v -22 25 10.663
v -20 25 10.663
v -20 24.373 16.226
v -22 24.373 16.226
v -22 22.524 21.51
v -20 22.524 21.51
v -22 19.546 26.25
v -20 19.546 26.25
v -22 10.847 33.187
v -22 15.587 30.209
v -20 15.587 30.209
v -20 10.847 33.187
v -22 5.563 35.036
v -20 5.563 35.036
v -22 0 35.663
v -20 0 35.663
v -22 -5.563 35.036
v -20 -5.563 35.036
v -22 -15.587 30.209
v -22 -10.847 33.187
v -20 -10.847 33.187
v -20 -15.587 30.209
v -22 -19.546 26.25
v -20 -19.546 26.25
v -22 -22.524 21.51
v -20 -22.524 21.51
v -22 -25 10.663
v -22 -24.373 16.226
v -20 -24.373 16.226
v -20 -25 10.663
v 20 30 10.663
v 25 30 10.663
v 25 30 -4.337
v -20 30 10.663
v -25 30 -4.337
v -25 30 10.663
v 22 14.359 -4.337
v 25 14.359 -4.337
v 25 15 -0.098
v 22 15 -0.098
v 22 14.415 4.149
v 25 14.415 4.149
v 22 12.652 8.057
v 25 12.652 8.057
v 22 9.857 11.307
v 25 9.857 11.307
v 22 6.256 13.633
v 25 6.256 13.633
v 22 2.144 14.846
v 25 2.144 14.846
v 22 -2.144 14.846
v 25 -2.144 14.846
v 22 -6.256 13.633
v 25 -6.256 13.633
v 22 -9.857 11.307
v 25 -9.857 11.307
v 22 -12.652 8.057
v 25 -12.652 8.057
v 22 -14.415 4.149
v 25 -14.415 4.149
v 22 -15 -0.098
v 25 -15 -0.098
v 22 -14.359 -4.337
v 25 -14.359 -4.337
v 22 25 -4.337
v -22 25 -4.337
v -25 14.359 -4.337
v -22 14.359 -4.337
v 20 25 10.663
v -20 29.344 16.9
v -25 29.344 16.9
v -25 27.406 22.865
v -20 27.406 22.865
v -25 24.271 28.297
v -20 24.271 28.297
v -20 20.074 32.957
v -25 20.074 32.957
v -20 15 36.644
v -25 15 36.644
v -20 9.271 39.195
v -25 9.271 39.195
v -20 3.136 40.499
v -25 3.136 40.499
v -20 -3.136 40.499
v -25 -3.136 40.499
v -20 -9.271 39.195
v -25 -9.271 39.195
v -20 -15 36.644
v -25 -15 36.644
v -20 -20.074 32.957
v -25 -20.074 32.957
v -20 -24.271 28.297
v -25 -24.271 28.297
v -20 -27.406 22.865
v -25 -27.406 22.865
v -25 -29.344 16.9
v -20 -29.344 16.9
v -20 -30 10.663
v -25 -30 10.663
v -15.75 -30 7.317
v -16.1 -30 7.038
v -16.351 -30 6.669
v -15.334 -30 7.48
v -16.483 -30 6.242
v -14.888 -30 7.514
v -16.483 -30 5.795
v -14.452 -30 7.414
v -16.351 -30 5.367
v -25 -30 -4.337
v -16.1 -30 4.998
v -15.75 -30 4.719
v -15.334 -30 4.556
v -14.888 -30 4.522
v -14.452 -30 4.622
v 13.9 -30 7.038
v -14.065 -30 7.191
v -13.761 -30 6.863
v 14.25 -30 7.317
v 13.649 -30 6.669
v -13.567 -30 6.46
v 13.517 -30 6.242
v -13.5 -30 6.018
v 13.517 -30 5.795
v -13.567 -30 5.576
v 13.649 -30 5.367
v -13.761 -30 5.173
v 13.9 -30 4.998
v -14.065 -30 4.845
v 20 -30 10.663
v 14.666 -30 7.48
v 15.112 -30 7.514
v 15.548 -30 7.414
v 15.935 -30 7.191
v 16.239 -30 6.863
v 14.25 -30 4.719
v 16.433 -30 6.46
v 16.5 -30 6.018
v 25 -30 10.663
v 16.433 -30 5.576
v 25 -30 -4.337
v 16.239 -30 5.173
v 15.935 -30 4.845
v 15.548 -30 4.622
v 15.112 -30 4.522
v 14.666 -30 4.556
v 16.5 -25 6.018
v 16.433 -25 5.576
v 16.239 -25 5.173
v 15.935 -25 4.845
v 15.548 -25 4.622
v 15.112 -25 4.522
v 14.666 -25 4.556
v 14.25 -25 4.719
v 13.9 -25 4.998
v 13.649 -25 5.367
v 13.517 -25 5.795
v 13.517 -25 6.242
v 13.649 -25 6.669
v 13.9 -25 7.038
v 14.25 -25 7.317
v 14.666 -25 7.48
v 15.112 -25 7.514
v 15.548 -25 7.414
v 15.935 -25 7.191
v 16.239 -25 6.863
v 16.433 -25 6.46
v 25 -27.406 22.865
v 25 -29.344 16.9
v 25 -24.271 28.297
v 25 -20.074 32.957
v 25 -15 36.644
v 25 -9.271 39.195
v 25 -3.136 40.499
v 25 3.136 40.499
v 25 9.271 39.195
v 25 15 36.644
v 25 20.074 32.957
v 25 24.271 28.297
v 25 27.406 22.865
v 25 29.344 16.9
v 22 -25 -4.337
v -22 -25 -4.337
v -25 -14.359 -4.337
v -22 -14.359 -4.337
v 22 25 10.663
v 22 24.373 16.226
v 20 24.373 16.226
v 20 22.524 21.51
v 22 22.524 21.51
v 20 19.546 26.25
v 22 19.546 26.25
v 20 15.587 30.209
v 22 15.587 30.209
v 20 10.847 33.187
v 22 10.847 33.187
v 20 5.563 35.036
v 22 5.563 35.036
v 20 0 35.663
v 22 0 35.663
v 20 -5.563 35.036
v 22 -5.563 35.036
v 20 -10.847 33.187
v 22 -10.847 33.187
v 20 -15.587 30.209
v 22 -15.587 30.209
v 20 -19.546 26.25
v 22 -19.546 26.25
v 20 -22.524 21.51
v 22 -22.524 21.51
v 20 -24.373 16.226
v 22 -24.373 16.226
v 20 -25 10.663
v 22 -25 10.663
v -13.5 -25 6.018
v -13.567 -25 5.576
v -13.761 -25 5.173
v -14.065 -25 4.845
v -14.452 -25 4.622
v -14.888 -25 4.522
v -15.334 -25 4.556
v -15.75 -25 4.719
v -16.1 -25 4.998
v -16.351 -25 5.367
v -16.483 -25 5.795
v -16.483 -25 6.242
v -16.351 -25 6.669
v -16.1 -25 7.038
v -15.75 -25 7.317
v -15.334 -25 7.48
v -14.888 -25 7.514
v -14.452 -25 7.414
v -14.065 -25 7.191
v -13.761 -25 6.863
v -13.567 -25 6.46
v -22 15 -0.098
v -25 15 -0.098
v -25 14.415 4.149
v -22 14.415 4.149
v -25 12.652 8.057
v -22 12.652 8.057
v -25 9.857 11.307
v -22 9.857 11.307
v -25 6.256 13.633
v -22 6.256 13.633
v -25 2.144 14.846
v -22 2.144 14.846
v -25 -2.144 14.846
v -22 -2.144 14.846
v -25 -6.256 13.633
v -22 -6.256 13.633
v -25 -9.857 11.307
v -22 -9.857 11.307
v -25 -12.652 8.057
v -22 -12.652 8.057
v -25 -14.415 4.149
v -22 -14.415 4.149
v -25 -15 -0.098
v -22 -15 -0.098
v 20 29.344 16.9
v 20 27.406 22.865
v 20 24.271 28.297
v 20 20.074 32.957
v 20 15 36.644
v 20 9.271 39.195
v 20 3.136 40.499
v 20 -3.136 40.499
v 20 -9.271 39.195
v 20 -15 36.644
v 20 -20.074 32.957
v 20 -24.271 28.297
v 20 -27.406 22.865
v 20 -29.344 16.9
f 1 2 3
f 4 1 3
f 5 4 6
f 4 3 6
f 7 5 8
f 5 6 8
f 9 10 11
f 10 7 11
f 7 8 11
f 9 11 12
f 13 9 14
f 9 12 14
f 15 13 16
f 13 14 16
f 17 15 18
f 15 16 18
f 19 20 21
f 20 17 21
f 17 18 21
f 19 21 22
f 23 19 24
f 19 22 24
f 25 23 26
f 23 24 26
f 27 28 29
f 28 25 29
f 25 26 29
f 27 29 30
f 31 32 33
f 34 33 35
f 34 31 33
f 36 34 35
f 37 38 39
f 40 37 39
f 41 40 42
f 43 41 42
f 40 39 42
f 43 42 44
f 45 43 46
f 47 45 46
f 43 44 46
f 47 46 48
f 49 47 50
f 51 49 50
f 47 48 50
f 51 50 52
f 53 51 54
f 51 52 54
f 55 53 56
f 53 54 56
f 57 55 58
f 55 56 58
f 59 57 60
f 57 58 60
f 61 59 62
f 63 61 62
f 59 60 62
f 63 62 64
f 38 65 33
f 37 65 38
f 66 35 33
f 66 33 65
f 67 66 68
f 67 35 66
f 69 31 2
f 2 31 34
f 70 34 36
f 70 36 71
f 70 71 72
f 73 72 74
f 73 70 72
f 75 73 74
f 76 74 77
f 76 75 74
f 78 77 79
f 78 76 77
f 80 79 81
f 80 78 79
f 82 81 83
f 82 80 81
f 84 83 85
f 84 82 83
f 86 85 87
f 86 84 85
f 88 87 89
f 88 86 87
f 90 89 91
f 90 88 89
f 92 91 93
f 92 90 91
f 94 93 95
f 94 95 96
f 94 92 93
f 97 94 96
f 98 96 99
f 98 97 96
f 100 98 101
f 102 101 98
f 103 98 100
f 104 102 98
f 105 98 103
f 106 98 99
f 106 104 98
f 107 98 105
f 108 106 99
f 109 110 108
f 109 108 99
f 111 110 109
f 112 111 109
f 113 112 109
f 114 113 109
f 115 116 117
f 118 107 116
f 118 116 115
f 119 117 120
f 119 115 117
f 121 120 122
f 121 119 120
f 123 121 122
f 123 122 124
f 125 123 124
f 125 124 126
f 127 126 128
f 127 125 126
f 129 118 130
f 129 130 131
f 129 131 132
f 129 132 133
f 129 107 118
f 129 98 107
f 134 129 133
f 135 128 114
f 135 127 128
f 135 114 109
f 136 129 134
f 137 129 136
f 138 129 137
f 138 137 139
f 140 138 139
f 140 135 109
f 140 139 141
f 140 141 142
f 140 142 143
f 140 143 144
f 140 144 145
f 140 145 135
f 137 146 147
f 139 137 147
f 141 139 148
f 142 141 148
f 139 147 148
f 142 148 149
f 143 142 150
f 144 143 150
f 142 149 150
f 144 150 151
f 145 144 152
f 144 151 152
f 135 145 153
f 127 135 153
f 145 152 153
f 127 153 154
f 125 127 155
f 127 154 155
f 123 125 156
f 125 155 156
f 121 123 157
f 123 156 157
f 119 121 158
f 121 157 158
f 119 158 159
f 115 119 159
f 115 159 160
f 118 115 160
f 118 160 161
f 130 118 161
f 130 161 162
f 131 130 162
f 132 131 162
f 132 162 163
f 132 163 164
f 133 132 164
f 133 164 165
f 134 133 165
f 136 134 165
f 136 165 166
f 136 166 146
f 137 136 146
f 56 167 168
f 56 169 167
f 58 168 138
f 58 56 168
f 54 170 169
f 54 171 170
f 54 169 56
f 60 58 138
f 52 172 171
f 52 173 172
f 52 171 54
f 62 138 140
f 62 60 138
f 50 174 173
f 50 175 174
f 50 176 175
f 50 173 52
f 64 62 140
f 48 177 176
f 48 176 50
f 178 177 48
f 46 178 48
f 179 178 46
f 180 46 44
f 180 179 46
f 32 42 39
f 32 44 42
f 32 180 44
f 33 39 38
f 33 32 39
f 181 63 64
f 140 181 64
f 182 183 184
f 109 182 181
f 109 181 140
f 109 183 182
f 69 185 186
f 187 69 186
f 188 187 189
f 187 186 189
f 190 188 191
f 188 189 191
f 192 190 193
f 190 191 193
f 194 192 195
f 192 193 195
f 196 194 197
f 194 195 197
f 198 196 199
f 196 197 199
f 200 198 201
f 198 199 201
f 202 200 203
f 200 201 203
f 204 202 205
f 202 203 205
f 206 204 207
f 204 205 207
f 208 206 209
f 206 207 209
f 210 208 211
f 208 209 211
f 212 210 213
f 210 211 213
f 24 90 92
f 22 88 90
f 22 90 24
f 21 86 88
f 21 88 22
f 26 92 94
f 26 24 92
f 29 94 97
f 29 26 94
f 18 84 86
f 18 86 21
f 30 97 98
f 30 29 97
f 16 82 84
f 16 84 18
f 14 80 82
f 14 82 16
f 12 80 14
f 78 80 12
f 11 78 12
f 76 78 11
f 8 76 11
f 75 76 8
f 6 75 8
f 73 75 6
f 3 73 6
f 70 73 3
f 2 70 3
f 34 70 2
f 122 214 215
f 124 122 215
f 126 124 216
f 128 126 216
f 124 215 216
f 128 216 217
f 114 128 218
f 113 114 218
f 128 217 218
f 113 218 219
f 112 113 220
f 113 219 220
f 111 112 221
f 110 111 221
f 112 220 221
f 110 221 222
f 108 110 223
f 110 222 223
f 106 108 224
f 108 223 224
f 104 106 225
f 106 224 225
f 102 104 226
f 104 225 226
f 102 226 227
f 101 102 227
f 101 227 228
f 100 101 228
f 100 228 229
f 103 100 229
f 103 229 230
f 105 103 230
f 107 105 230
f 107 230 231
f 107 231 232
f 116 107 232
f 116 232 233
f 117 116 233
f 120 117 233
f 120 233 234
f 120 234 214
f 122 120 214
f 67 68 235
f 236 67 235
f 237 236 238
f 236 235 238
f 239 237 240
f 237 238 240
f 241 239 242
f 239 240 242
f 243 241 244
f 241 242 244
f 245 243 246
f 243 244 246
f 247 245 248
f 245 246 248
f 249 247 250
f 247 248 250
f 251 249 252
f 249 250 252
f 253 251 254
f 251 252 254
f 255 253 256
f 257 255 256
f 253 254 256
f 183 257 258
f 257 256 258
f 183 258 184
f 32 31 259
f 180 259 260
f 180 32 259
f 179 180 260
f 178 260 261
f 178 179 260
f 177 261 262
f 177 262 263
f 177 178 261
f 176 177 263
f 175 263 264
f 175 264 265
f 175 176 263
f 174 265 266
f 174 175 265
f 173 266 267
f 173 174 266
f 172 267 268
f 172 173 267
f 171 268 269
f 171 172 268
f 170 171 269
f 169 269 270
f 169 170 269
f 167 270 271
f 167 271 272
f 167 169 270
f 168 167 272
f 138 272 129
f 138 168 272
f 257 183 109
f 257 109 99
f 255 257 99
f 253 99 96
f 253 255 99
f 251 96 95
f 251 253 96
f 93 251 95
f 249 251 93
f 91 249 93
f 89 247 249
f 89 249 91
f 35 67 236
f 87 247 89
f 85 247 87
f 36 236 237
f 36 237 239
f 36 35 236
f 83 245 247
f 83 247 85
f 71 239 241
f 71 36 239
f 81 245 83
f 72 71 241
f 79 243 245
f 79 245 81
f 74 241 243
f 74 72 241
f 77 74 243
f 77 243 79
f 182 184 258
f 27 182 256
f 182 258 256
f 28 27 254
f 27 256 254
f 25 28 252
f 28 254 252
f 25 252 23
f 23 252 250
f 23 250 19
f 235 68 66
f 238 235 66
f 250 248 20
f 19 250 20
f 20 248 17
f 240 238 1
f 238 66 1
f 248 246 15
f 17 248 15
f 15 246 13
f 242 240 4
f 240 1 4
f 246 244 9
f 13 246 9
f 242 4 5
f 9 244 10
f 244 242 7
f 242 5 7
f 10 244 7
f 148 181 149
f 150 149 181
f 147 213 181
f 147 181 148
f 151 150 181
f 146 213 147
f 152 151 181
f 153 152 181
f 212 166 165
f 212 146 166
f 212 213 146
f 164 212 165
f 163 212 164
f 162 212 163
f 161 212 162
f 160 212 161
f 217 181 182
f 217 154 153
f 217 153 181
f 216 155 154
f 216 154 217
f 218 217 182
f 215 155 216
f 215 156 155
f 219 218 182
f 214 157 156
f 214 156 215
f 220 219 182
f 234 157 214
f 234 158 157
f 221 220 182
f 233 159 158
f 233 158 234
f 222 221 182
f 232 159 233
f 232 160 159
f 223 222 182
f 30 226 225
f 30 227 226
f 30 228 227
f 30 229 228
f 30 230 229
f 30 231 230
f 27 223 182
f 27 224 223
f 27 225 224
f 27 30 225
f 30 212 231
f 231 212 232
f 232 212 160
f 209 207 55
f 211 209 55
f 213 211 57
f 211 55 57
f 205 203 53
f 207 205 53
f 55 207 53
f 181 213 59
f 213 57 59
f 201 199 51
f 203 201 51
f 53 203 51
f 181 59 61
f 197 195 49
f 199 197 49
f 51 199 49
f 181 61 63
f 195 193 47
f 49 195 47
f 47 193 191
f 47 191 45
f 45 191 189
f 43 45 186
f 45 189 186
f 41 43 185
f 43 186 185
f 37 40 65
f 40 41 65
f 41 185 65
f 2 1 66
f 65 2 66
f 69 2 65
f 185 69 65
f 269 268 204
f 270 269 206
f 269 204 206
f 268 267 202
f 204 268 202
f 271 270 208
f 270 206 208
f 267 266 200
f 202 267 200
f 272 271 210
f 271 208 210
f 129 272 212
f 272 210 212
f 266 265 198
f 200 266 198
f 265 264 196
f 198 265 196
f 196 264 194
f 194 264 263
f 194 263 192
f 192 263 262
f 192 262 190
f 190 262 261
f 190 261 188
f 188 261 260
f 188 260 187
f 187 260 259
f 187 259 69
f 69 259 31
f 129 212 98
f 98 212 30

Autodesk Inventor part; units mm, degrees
ref_plane "YZ Plane" through (0, 0, 0) normal (1, 0, 0) x (0, 1, 0)
ref_plane "XZ Plane" through (0, 0, 0) normal (0, 1, 0) x (-1, 0, 0)
sketch "Szkic1" plane through (0, 0, 0) normal (0, 0, 1) x (1, 0, 0)
  line L0 (19.3649, 0) -> (-19.3649, 0)
  line L1 (-19.3649, 0) -> (-103.6215, 0)
  line L2 (-103.6215, 0) -> (-125, 0)
  line L3 (-125, 0) -> (-103.6215, 0)
  line L4 (-103.6215, 0) -> (-19.3649, 0)
  line L5 (-19.3649, 0) -> (19.3649, 0)
  line L6 (19.3649, 0) -> (103.6215, 0)
  line L7 (103.6215, 0) -> (125, 0)
  line L8 (125, 0) -> (103.6215, 0)
  line L9 (103.6215, 0) -> (19.3649, 0)
  line L10 (45, 0) -> (-45, 0)
  line L11 (45, 0) -> (105.3748, 0)
  line L12 (105.3748, 0) -> (130.0712, 0)
  line L13 (130.0712, 0) -> (105.3748, 0)
  line L14 (105.3748, 0) -> (-20.2973, 0)
  line L15 (-20.2973, 0) -> (-105.3748, 0)
  line L16 (-105.3748, 0) -> (-105.3748, 0)
  line L17 (-105.3748, 0) -> (-130.0712, 0)
  line L18 (-130.0712, 0) -> (-105.3748, 0)
  line L19 (-105.3748, 0) -> (-45, 0)
  arc A0 (119.2902, -19.1594) -> (125, 0) centre (90, 0) ccw
  arc A1 (19.3649, -35) -> (103.6215, -25.7743) centre (42.8262, 140.0954) ccw
  arc A2 (103.6215, -25.7743) -> (125, 0) centre (91.4189, 6.1005) ccw
  arc A3 (20.2973, -40.1624) -> (105.3748, -30.457) centre (42.8262, 140.0954) ccw
  arc A4 (105.3748, -30.457) -> (130.0712, 0) centre (91.4189, 6.1005) ccw
  arc A5 (-125, 0) -> (-103.6215, -25.7743) centre (-91.4189, 6.1005) ccw
  arc A6 (-130.0712, 0) -> (-105.3748, -30.457) centre (-91.4189, 6.1005) ccw
  arc A7 (-98.4086, -33.9749) -> (-78.2644, -32.9739) centre (-90, 0) ccw
  arc A8 (-103.6215, -25.7743) -> (-19.3649, -35) centre (-42.8262, 140.0954) ccw
  arc A9 (-19.3649, -35) -> (19.3649, -35) centre (0, 0) ccw
  arc A10 (-20.2973, -40.1624) -> (20.2973, -40.1624) centre (0, 0) ccw
  arc A11 (-105.3748, -30.457) -> (-20.2973, -40.1624) centre (-42.8262, 140.0954) ccw
  line L20 (-105.3748, 0) -> (-20.2973, 0)
  line L21 (19.3649, 0) -> (-19.3649, 0)
  line L22 (130.0712, 0) -> (-130.0712, 0)
  point P0 (0, 0)
  point P1 (-119.2902, -19.1594)
  point P2 (-125, 0)
  point P3 (125, 0)
  dimension "d0" = 70
  dimension "d1" = 70
  dimension "d2" = 250
  dimension "d3" = 90
revolve "Obrót1" add sketch "Szkic1" angle 180 about axis through (130.0712, 0, 0) along (-1, 0, 0) contours L12 A4 A3 A10 A11 A7 A8 A9 A1 A2 | A5 A8 A7 A11 A6 L17
sketch "Szkic2" plane through (0, 0, 0) normal (0, 1, 0) x (-1, 0, 0)
  line L0 (-25, 45) -> (25, 45)
  line L1 (25, 45) -> (25, 15)
  line L2 (25, 15) -> (-25, 15)
  line L3 (-25, 15) -> (-25, 45)
  line L4 (-20.2973, 0) -> (20.2973, 0) projected
  arc A0 (105.3748, 30.457) -> (20.2973, 40.1624) centre (42.8262, -140.0954) ccw projected
  arc A1 (20.2973, 40.1624) -> (-20.2973, 40.1624) centre (0, 0) ccw projected
  point P0 (0, 0)
  point P1 (0, 45)
  point P2 (0, 0)
  point P3 (0, 45)
  dimension "d5" = 50
  dimension "d6" = 30
extrude "Wyciągnięcie proste1" cut sketch "Szkic2" along normal mid plane 91
sketch "Szkic3" plane through (25, 0, 0) normal (-1, 0, 0) x (0, 0, 1)
  point P0 (0, 0)
sketch "Szkic4" plane through (25, 0, 0) normal (-1, 0, 0) x (0, 0, 1)
  arc A0 (15, -37.8222) -> (15, 37.8222) centre (0, 0) ccw projected
  line L0 (15, 37.8222) -> (15, 32.3552) projected
  arc A1 (15, -32.3552) -> (15, 32.3552) centre (0, 0) ccw projected
  line L1 (15, -32.3552) -> (15, -37.8222) projected
  circle A2 centre (10.6631, 0) radius 25
  arc A3 (15, -32.3552) -> (15, 32.3552) centre (0, 0) ccw projected
  circle A4 centre (10.6631, 0) radius 30
  point P0 (0, 0)
  point P1 (35.6631, 0)
  point P2 (22.7682, 27.4494)
  point P3 (22.7682, -27.4494)
  point P4 (35.6631, 0)
  dimension "d9" = 50
  dimension "d19" = 60
extrude "Wyciągnięcie proste2" add sketch "Szkic4" along normal blind 50 contours A4 A1 | A1 A4
sketch "Szkic5" plane through (25, 0, 10.6631) normal (1, 0, 0) x (0, 0, -1)
  arc A0 (-12.1051, -27.4494) -> (-12.1051, 27.4494) centre (0, 0) ccw projected
  circle A1 centre (0, 0) radius 25 projected
  line L0 (0, 25) -> (0, 30)
  line L1 (0, -25) -> (0, -30)
  point P0 (10.6631, 0)
  point P1 (-12.0349, 27.5074)
  point P2 (-12.0349, -27.5074)
  point P3 (-25, 0)
extrude "Wyciągnięcie proste3" cut sketch "Szkic5" against normal blind 50 contours L1 A1 L0 A0
ref_plane "Płaszczyzna konstrukcyjna1" through (0, 0, 0) normal (1, 0, 0) x (0, 0, -1)
sketch "Szkic7" plane through (0, 0, 0) normal (1, 0, 0) x (0, 0, -1)
  arc A0 (-10.6631, 25) -> (-35.6631, 0) centre (-10.6631, 0) ccw projected
  circle A1 centre (-10.6631, 0) radius 25
  circle A2 centre (-10.6631, 0) radius 30
  point P0 (0, 0)
  point P1 (-35.6631, 0)
  dimension "d16" = 5
extrude "Wyciągnięcie proste4" cut sketch "Szkic7" along normal mid plane 40
sketch "Szkic8" plane through (0, 0, 0) normal (1, 0, 0) x (0, 0, -1)
  point P0 (0, 0)
sketch "Szkic9" plane through (-25, -30, 10.6631) normal (0, 0, -1) x (-1, 0, 0)
  line L0 (-5, 5) -> (-5, 0) projected
  line L1 (0, 0) -> (-5, 0) projected
  line L2 (0, 5) -> (0, 0) projected
  line L3 (-5, 5) -> (0, 5) projected
  line L4 (-45, 0) -> (-45, 5) projected
  line L5 (-50, 5) -> (-45, 5) projected
  line L6 (-50, 0) -> (-50, 5) projected
  line L7 (-45, 0) -> (-50, 0) projected
  line L8 (-5, 60) -> (-5, 55) projected
  line L9 (0, 55) -> (-5, 55) projected
  line L10 (0, 60) -> (0, 55) projected
  line L11 (-5, 60) -> (0, 60) projected
  line L12 (-45, 55) -> (-45, 60) projected
  line L13 (-50, 60) -> (-45, 60) projected
  line L14 (-50, 55) -> (-50, 60) projected
  line L15 (-45, 55) -> (-50, 55) projected
  line L16 (0, 55) -> (-50, 55)
  line L17 (-50, 60) -> (0, 60)
  line L18 (0, 0) -> (0, 5)
  line L19 (-50, 5) -> (-50, 0)
  line L20 (0, 5) -> (-50, 5)
  line L21 (0, 0) -> (-50, 0)
  point P0 (-25, 30)
extrude "Wyciągnięcie proste5" add sketch "Szkic9" along normal blind 10
sketch "Szkic10" plane through (-20, 30, 10.6631) normal (0, 1, 0) x (1, 0, 0)
  line L0 (0, 0) -> (-5, 0) projected
  line L1 (0, 0) -> (40, 0) projected
  line L2 (45, 0) -> (40, 0) projected
  line L3 (45, 0) -> (45, 10) projected
  line L4 (-5, 10) -> (45, 10) projected
  line L5 (-5, 0) -> (-5, 10) projected
  point P0 (20, 10.6631)
sketch "Szkic15" plane through (-25, -30, 0.6631) normal (0, 0, -1) x (-1, 0, 0)
  line L0 (-50, 60) -> (-50, 55) projected
  line L1 (-50, 60) -> (-0.0556, 60)
  line L2 (-0.0556, 60) -> (-0.0556, 70)
  line L3 (-0.0556, 70) -> (-50, 70)
  line L4 (-50, 70) -> (-50, 60)
  line L5 (0, 55) -> (0, 60) projected
  arc A0 (-5.6351, 65) -> (-44.3649, 65) centre (-25, 30) ccw projected
  point P0 (-25, 30)
  point P1 (-25.0278, 70)
  point P2 (-25, 70)
extrude "Wyciągnięcie proste6" add sketch "Szkic15" against normal blind 3
sketch "Szkic18" plane through (-20, -25, 10.6631) normal (0, 1, 0) x (1, 0, 0)
  line L0 (0, 0) -> (-5, 0) projected
  line L1 (0, 0) -> (40, 0) projected
  line L2 (45, 0) -> (40, 0) projected
  line L3 (45, 0) -> (45, 10) projected
  line L4 (-5, 10) -> (45, 10) projected
  line L5 (-5, 0) -> (-5, 10) projected
  point P0 (20, 10.6631)
extrude "Wyciągnięcie proste9" add sketch "Szkic18" against normal blind 13.5
sketch "Szkic19" plane through (0, 0, 0) normal (0, 0, -1) x (-1, 0, 0)
  arc A0 (-130.0712, 0) -> (-105.3748, -30.457) centre (-91.4189, 6.1005) ccw projected
  arc A1 (-105.3748, -30.457) -> (-20.2973, -40.1624) centre (-42.8262, 140.0954) ccw projected
  arc A2 (-20.2973, -40.1624) -> (20.2973, -40.1624) centre (0, 0) ccw projected
  arc A3 (20.2973, -40.1624) -> (105.3748, -30.457) centre (42.8262, 140.0954) ccw projected
  arc A4 (105.3748, -30.457) -> (130.0712, 0) centre (91.4189, 6.1005) ccw projected
  arc A5 (130.0712, 0) -> (105.3748, 30.457) centre (91.4189, -6.1005) ccw projected
  arc A6 (105.3748, 30.457) -> (20.2973, 40.1624) centre (42.8262, -140.0954) ccw projected
  arc A7 (20.2973, 40.1624) -> (-20.2973, 40.1624) centre (0, 0) ccw projected
  arc A8 (-20.2973, 40.1624) -> (-105.3748, 30.457) centre (-42.8262, -140.0954) ccw projected
  arc A9 (-105.3748, 30.457) -> (-130.0712, 0) centre (-91.4189, -6.1005) ccw projected
  arc A10 (-103.6215, 25.7743) -> (-125, 0) centre (-91.4189, -6.1005) ccw projected
  arc A11 (-19.3649, 35) -> (-103.6215, 25.7743) centre (-42.8262, -140.0954) ccw projected
  arc A12 (19.3649, 35) -> (-19.3649, 35) centre (0, 0) ccw projected
  arc A13 (103.6215, 25.7743) -> (19.3649, 35) centre (42.8262, -140.0954) ccw projected
  arc A14 (125, 0) -> (103.6215, 25.7743) centre (91.4189, -6.1005) ccw projected
  arc A15 (103.6215, -25.7743) -> (125, 0) centre (91.4189, 6.1005) ccw projected
  arc A16 (19.3649, -35) -> (103.6215, -25.7743) centre (42.8262, 140.0954) ccw projected
  arc A17 (-19.3649, -35) -> (19.3649, -35) centre (0, 0) ccw projected
  arc A18 (-103.6215, -25.7743) -> (-19.3649, -35) centre (-42.8262, 140.0954) ccw projected
  arc A19 (-125, 0) -> (-103.6215, -25.7743) centre (-91.4189, 6.1005) ccw projected
  line L0 (-130.0712, 0) -> (130.0712, 0)
  line L1 (-25, 34.6933) -> (-25, -34.6933) projected
  line L2 (-25, 34.6933) -> (-25, 40.6881)
  line L3 (-25, -34.6933) -> (-25, -40.6881)
  line L4 (25, -27.4494) -> (25, 27.4494) projected
  line L5 (25, 27.4494) -> (25, 40.6881)
  line L6 (25, -27.4494) -> (25, -40.6881)
  point P0 (0, 0)
  point P1 (25, 35.6631)
  point P2 (125, 0)
  point P3 (-125, 0)
  point P4 (-25, 35.6631)
  point P5 (-25, 37.8222)
  point P6 (-25, -37.8222)
revolve "Obrót4" cut sketch "Szkic19" angle 360 about axis through (130.0712, 0, 0) along (-1, 0, 0) contours A9 A8 L2 A11 A10 L0 | A14 A13 L5 A6 A5 L0
sketch "Szkic20" plane through (0, 0, 0) normal (0, 0, -1) x (-1, 0, 0)
  line L0 (25, -40.6881) -> (25, -35.6631) projected
  arc A0 (25, 40.6881) -> (20.2973, 40.1624) centre (42.8262, -140.0954) ccw projected
  arc A1 (20.2973, 40.1624) -> (-20.2973, 40.1624) centre (0, 0) ccw projected
  arc A2 (-20.2973, 40.1624) -> (-25, 40.6881) centre (-42.8262, -140.0954) ccw projected
  line L1 (-25, 40.6881) -> (-25, 35.6631) projected
  arc A3 (-19.3649, 35) -> (-25, 35.6631) centre (-42.8262, -140.0954) ccw projected
  arc A4 (19.3649, 35) -> (-19.3649, 35) centre (0, 0) ccw projected
  arc A5 (25, 35.6631) -> (19.3649, 35) centre (42.8262, -140.0954) ccw projected
  line L2 (25, -27.4494) -> (25, 27.4494) projected
  line L3 (25, 0) -> (-25, 0)
  arc A6 (19.3649, -35) -> (25, -35.6631) centre (42.8262, 140.0954) ccw projected
  arc A7 (-19.3649, -35) -> (19.3649, -35) centre (0, 0) ccw projected
  arc A8 (-25, -35.6631) -> (-19.3649, -35) centre (-42.8262, 140.0954) ccw projected
  line L4 (-25, -35.6631) -> (-25, -40.6881) projected
  arc A9 (-25, -40.6881) -> (-20.2973, -40.1624) centre (-42.8262, 140.0954) ccw projected
  arc A10 (-20.2973, -40.1624) -> (20.2973, -40.1624) centre (0, 0) ccw projected
  arc A11 (20.2973, -40.1624) -> (25, -40.6881) centre (42.8262, 140.0954) ccw projected
  line L5 (25, 35.6631) -> (25, 40.6881) projected
  point P0 (0, 0)
  point P1 (25, 30)
  point P2 (25, -30)
revolve "Obrót5" cut sketch "Szkic20" angle 30 about axis through (-25, 0, 0) along (1, 0, 0) contours L5 A5 A4 A3 L1 A2 A1 A0
sketch "Szkic23" plane through (0, 0, 0) normal (0, 0, -1) x (-1, 0, 0)
  line L0 (25, -40.6881) -> (25, -35.6631) projected
  arc A0 (19.3649, -35) -> (25, -35.6631) centre (42.8262, 140.0954) ccw projected
  arc A1 (-19.3649, -35) -> (19.3649, -35) centre (0, 0) ccw projected
  arc A2 (-25, -35.6631) -> (-19.3649, -35) centre (-42.8262, 140.0954) ccw projected
  line L1 (-25, -35.6631) -> (-25, -40.6881) projected
  arc A3 (-25, -40.6881) -> (-20.2973, -40.1624) centre (-42.8262, 140.0954) ccw projected
  arc A4 (-20.2973, -40.1624) -> (20.2973, -40.1624) centre (0, 0) ccw projected
  arc A5 (20.2973, -40.1624) -> (25, -40.6881) centre (42.8262, 140.0954) ccw projected
  line L2 (0, 0) -> (-25.9666, 0)
  point P0 (0, 0)
revolve "Obrót6" cut sketch "Szkic23" angle 30 about axis through (0, 0, 0) along (-1, 0, 0)
sketch "Szkic24" plane through (25, 0, 0) normal (1, 0, 0) x (0, 0, -1)
  arc A0 (-10.6631, -34.0317) -> (-0.6631, -35.657) centre (0, 0) ccw projected
  line L0 (-0.6631, -25) -> (-0.6631, -35.657) projected
  line L1 (-10.6631, -25) -> (-0.6631, -25) projected
  arc A1 (-10.6631, 25) -> (-10.6631, -25) centre (-10.6631, 0) ccw projected
  line L2 (-10.6631, 25) -> (-0.6631, 25) projected
  line L3 (-0.6631, 35.657) -> (-0.6631, 25) projected
  arc A2 (-0.6631, 35.657) -> (-3.6631, 35.4745) centre (0, 0) ccw projected
  line L4 (-3.6631, 30) -> (-3.6631, 35.4745) projected
  line L5 (-10.6631, 30) -> (-3.6631, 30) projected
  arc A3 (-10.6631, 30) -> (-10.6631, -30) centre (-10.6631, 0) ccw projected
  line L6 (-10.6631, -30) -> (-10.6631, -34.0317) projected
  line L7 (-10.6631, -30) -> (-0.6631, -30)
  line L8 (-10.6631, 30) -> (-10.6631, 45.858)
  line L9 (-10.6631, 45.858) -> (14.375, 45.858)
  line L10 (14.375, 45.858) -> (14.375, -45.1514)
  line L11 (14.375, -45.1514) -> (-20.0352, -45.1514)
  line L12 (-10.6631, -30) -> (-10.6631, -34.0317) projected
  line L13 (-20.0352, -45.1514) -> (-10.6631, -30)
  line L14 (-10.6631, 30) -> (-0.6631, 30)
  line L15 (-10.6631, 25) -> (-0.6631, 25) projected
  line L16 (-0.6631, 25) -> (-10.6631, 25)
  point P0 (0, 0)
extrude "Wyciągnięcie proste10" cut sketch "Szkic24" against normal blind 61.5 contours L6 L7 L0 A0 | A0 L0 L1 A1 L2 L3 A2 L4 L5 L8 L9 L10 L11 L13 L6 | L4 A2 L3 L14
sketch "Szkic25" plane through (-20, -25, 10.6631) normal (0, 1, 0) x (1, 0, 0)
  circle A0 centre (35, 4.645) radius 1.5
  circle A1 centre (5, 4.645) radius 1.5
  line L0 (45, 0) -> (45, 10) projected
  point P0 (20, 10.6631)
  dimension "d38" = 3
  dimension "d39" = 3
  dimension "d40" = 10
  dimension "d41" = 30
extrude "Wyciągnięcie proste11" cut sketch "Szkic25" against normal blind 61.5
sketch "Szkic26" plane through (-25, -30, 0.6631) normal (0, 0, -1) x (-1, 0, 0)
  point P0 (-25, 30)
sketch "Szkic27" plane through (-25, -30, 0.6631) normal (0, 0, -1) x (-1, 0, 0)
  line L0 (0, 60) -> (-50, 60) projected
  line L1 (-50, 60) -> (-50, 55) projected
  line L2 (-50, 55) -> (0, 55) projected
  line L3 (0, 55) -> (0, 60) projected
  line L4 (-50, 0) -> (0, 0) projected
  line L5 (0, 5) -> (0, 0) projected
  line L6 (0, 5) -> (-50, 5) projected
  line L7 (-50, 5) -> (-50, 0) projected
  point P0 (-25, 30)
extrude "Wyciągnięcie proste12" add sketch "Szkic27" along normal blind 5
sketch "Szkic28" plane through (25, 0, 0) normal (1, 0, 0) x (0, 0, -1)
  line L0 (-10.6631, -30) -> (4.3369, -30) projected
  line L1 (4.3369, -25) -> (4.3369, -30) projected
  line L2 (-10.6631, -25) -> (4.3369, -25) projected
  arc A0 (-10.6631, 25) -> (-10.6631, -25) centre (-10.6631, 0) ccw projected
  line L3 (-10.6631, 25) -> (4.3369, 25) projected
  line L4 (4.3369, 30) -> (4.3369, 25) projected
  line L5 (-10.6631, 30) -> (4.3369, 30) projected
  arc A1 (-10.6631, 30) -> (-10.6631, -30) centre (-10.6631, 0) ccw projected
  line L6 (4.3369, 25) -> (4.3369, -25)
  point P0 (0, 0)
extrude "Wyciągnięcie proste13" add sketch "Szkic28" against normal blind 3 contours L2 A0 L3 L6
sketch "Szkic29" plane through (-25, 0, 0) normal (-1, 0, 0) x (0, 0, 1)
  line L0 (10.6631, -25) -> (-4.3369, -25) projected
  arc A0 (10.6631, -25) -> (10.6631, 25) centre (10.6631, 0) ccw projected
  line L1 (-4.3369, 25) -> (10.6631, 25) projected
  line L2 (-4.3369, 25) -> (-4.3369, -25) projected
  point P0 (0, 0)
extrude "Wyciągnięcie proste14" add sketch "Szkic29" against normal blind 3
sketch "Szkic30" plane through (25, 0, 0) normal (1, 0, 0) x (0, 0, -1)
  circle A0 centre (0, 0) radius 15
  dimension "d50" = 30
extrude "Wyciągnięcie proste15" cut sketch "Szkic30" against normal blind 71
properties part number "przód2" material "Tworzywo sztuczne PET"
